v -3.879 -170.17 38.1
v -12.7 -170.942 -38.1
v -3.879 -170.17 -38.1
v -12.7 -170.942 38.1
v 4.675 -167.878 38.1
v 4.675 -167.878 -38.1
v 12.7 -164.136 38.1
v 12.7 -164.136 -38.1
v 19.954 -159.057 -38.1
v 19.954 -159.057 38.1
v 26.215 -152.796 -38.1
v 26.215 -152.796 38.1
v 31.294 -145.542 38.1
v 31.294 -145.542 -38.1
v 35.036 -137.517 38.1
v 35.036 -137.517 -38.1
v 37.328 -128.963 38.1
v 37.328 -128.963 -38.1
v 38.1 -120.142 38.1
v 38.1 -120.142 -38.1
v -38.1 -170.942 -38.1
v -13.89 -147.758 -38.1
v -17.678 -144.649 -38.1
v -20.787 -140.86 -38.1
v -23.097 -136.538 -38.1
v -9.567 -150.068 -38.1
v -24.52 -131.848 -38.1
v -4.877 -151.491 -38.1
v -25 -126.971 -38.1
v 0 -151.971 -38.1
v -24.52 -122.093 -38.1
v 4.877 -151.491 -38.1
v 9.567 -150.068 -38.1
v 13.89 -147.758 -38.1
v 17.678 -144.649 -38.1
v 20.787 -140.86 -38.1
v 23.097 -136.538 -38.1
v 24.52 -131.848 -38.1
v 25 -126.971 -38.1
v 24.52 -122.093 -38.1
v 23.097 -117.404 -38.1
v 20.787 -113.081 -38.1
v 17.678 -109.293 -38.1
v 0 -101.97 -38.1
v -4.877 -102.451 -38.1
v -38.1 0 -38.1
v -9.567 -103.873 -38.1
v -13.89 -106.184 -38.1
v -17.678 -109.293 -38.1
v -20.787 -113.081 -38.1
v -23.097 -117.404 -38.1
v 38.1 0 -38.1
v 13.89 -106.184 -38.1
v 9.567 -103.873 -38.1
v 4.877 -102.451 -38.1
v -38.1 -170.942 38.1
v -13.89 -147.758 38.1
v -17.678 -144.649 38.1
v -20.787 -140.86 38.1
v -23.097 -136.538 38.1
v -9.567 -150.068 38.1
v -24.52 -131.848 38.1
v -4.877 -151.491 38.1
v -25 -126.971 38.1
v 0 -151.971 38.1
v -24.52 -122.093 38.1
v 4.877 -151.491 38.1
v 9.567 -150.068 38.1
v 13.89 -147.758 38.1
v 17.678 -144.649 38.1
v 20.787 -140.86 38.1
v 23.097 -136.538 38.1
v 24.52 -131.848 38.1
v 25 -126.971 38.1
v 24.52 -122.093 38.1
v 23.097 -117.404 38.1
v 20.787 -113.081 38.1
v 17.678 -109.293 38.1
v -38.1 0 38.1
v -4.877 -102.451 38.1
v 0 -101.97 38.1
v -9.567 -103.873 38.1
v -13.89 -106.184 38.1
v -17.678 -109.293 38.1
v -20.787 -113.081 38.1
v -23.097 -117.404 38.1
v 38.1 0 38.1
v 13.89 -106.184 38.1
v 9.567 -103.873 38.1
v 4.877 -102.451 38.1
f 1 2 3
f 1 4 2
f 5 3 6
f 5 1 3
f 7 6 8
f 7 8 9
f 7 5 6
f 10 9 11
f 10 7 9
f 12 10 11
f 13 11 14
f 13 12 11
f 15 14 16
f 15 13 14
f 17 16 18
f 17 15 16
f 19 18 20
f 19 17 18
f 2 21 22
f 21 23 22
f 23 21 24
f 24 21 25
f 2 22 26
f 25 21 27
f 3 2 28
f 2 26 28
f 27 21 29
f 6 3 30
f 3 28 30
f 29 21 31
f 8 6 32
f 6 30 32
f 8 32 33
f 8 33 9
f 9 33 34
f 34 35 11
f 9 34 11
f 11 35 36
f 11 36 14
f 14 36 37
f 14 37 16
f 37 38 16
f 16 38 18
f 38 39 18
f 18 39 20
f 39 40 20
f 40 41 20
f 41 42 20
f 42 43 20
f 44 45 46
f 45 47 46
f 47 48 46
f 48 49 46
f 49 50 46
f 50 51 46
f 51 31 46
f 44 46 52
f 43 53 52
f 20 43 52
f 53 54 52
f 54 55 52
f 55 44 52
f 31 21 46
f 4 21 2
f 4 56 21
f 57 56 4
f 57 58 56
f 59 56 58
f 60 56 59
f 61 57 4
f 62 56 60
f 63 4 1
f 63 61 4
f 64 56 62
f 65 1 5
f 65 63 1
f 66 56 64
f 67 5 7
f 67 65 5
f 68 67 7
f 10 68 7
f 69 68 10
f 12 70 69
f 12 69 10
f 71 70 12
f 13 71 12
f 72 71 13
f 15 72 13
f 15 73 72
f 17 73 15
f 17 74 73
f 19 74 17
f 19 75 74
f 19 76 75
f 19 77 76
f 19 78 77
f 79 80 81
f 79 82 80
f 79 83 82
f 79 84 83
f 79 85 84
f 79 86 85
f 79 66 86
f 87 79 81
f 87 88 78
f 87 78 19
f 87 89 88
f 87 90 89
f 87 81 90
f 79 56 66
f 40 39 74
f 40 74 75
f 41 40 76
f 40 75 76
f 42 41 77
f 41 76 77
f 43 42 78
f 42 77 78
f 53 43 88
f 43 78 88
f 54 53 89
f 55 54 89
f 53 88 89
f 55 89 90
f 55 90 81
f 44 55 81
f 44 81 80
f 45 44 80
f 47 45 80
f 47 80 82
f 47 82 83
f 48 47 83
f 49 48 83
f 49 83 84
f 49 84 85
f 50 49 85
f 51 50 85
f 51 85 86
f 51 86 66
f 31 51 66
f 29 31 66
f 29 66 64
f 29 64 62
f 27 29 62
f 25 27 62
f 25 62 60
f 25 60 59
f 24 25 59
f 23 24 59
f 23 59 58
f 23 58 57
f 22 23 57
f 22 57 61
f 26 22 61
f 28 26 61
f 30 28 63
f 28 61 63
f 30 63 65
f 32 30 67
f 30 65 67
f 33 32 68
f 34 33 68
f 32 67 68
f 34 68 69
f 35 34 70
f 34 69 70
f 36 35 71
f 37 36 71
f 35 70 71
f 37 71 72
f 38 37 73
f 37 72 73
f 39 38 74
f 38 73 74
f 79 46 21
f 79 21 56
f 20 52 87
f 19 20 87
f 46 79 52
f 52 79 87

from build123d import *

# Parameters (mm, degrees)
F0_W     = 76.2
F0_H     = 76.2
F1_DEPTH = 170.942
F2_R     = 25.000448
F3_DEPTH = 76.201
F4_R     = 50.8


with BuildPart() as f1:
    # F0 (on Front) → F1 (new body)
    with BuildSketch(Plane.XZ):
        Rectangle(F0_W, F0_H)
    extrude(amount=F1_DEPTH)

    # F2 (on face) → F3 (cut, through all)
    with BuildSketch(Plane.XY.offset(38.1)):
        with Locations((0, -126.970813)):
            Circle(F2_R)
    extrude(amount=-F3_DEPTH, mode=Mode.SUBTRACT)

    # F4
    f4_edges = [f1.edges().sort_by_distance(p)[0] for p in [
        (38.1, -170.942, 0),
    ]]
    fillet(f4_edges, radius=F4_R)


solid = f1.part
